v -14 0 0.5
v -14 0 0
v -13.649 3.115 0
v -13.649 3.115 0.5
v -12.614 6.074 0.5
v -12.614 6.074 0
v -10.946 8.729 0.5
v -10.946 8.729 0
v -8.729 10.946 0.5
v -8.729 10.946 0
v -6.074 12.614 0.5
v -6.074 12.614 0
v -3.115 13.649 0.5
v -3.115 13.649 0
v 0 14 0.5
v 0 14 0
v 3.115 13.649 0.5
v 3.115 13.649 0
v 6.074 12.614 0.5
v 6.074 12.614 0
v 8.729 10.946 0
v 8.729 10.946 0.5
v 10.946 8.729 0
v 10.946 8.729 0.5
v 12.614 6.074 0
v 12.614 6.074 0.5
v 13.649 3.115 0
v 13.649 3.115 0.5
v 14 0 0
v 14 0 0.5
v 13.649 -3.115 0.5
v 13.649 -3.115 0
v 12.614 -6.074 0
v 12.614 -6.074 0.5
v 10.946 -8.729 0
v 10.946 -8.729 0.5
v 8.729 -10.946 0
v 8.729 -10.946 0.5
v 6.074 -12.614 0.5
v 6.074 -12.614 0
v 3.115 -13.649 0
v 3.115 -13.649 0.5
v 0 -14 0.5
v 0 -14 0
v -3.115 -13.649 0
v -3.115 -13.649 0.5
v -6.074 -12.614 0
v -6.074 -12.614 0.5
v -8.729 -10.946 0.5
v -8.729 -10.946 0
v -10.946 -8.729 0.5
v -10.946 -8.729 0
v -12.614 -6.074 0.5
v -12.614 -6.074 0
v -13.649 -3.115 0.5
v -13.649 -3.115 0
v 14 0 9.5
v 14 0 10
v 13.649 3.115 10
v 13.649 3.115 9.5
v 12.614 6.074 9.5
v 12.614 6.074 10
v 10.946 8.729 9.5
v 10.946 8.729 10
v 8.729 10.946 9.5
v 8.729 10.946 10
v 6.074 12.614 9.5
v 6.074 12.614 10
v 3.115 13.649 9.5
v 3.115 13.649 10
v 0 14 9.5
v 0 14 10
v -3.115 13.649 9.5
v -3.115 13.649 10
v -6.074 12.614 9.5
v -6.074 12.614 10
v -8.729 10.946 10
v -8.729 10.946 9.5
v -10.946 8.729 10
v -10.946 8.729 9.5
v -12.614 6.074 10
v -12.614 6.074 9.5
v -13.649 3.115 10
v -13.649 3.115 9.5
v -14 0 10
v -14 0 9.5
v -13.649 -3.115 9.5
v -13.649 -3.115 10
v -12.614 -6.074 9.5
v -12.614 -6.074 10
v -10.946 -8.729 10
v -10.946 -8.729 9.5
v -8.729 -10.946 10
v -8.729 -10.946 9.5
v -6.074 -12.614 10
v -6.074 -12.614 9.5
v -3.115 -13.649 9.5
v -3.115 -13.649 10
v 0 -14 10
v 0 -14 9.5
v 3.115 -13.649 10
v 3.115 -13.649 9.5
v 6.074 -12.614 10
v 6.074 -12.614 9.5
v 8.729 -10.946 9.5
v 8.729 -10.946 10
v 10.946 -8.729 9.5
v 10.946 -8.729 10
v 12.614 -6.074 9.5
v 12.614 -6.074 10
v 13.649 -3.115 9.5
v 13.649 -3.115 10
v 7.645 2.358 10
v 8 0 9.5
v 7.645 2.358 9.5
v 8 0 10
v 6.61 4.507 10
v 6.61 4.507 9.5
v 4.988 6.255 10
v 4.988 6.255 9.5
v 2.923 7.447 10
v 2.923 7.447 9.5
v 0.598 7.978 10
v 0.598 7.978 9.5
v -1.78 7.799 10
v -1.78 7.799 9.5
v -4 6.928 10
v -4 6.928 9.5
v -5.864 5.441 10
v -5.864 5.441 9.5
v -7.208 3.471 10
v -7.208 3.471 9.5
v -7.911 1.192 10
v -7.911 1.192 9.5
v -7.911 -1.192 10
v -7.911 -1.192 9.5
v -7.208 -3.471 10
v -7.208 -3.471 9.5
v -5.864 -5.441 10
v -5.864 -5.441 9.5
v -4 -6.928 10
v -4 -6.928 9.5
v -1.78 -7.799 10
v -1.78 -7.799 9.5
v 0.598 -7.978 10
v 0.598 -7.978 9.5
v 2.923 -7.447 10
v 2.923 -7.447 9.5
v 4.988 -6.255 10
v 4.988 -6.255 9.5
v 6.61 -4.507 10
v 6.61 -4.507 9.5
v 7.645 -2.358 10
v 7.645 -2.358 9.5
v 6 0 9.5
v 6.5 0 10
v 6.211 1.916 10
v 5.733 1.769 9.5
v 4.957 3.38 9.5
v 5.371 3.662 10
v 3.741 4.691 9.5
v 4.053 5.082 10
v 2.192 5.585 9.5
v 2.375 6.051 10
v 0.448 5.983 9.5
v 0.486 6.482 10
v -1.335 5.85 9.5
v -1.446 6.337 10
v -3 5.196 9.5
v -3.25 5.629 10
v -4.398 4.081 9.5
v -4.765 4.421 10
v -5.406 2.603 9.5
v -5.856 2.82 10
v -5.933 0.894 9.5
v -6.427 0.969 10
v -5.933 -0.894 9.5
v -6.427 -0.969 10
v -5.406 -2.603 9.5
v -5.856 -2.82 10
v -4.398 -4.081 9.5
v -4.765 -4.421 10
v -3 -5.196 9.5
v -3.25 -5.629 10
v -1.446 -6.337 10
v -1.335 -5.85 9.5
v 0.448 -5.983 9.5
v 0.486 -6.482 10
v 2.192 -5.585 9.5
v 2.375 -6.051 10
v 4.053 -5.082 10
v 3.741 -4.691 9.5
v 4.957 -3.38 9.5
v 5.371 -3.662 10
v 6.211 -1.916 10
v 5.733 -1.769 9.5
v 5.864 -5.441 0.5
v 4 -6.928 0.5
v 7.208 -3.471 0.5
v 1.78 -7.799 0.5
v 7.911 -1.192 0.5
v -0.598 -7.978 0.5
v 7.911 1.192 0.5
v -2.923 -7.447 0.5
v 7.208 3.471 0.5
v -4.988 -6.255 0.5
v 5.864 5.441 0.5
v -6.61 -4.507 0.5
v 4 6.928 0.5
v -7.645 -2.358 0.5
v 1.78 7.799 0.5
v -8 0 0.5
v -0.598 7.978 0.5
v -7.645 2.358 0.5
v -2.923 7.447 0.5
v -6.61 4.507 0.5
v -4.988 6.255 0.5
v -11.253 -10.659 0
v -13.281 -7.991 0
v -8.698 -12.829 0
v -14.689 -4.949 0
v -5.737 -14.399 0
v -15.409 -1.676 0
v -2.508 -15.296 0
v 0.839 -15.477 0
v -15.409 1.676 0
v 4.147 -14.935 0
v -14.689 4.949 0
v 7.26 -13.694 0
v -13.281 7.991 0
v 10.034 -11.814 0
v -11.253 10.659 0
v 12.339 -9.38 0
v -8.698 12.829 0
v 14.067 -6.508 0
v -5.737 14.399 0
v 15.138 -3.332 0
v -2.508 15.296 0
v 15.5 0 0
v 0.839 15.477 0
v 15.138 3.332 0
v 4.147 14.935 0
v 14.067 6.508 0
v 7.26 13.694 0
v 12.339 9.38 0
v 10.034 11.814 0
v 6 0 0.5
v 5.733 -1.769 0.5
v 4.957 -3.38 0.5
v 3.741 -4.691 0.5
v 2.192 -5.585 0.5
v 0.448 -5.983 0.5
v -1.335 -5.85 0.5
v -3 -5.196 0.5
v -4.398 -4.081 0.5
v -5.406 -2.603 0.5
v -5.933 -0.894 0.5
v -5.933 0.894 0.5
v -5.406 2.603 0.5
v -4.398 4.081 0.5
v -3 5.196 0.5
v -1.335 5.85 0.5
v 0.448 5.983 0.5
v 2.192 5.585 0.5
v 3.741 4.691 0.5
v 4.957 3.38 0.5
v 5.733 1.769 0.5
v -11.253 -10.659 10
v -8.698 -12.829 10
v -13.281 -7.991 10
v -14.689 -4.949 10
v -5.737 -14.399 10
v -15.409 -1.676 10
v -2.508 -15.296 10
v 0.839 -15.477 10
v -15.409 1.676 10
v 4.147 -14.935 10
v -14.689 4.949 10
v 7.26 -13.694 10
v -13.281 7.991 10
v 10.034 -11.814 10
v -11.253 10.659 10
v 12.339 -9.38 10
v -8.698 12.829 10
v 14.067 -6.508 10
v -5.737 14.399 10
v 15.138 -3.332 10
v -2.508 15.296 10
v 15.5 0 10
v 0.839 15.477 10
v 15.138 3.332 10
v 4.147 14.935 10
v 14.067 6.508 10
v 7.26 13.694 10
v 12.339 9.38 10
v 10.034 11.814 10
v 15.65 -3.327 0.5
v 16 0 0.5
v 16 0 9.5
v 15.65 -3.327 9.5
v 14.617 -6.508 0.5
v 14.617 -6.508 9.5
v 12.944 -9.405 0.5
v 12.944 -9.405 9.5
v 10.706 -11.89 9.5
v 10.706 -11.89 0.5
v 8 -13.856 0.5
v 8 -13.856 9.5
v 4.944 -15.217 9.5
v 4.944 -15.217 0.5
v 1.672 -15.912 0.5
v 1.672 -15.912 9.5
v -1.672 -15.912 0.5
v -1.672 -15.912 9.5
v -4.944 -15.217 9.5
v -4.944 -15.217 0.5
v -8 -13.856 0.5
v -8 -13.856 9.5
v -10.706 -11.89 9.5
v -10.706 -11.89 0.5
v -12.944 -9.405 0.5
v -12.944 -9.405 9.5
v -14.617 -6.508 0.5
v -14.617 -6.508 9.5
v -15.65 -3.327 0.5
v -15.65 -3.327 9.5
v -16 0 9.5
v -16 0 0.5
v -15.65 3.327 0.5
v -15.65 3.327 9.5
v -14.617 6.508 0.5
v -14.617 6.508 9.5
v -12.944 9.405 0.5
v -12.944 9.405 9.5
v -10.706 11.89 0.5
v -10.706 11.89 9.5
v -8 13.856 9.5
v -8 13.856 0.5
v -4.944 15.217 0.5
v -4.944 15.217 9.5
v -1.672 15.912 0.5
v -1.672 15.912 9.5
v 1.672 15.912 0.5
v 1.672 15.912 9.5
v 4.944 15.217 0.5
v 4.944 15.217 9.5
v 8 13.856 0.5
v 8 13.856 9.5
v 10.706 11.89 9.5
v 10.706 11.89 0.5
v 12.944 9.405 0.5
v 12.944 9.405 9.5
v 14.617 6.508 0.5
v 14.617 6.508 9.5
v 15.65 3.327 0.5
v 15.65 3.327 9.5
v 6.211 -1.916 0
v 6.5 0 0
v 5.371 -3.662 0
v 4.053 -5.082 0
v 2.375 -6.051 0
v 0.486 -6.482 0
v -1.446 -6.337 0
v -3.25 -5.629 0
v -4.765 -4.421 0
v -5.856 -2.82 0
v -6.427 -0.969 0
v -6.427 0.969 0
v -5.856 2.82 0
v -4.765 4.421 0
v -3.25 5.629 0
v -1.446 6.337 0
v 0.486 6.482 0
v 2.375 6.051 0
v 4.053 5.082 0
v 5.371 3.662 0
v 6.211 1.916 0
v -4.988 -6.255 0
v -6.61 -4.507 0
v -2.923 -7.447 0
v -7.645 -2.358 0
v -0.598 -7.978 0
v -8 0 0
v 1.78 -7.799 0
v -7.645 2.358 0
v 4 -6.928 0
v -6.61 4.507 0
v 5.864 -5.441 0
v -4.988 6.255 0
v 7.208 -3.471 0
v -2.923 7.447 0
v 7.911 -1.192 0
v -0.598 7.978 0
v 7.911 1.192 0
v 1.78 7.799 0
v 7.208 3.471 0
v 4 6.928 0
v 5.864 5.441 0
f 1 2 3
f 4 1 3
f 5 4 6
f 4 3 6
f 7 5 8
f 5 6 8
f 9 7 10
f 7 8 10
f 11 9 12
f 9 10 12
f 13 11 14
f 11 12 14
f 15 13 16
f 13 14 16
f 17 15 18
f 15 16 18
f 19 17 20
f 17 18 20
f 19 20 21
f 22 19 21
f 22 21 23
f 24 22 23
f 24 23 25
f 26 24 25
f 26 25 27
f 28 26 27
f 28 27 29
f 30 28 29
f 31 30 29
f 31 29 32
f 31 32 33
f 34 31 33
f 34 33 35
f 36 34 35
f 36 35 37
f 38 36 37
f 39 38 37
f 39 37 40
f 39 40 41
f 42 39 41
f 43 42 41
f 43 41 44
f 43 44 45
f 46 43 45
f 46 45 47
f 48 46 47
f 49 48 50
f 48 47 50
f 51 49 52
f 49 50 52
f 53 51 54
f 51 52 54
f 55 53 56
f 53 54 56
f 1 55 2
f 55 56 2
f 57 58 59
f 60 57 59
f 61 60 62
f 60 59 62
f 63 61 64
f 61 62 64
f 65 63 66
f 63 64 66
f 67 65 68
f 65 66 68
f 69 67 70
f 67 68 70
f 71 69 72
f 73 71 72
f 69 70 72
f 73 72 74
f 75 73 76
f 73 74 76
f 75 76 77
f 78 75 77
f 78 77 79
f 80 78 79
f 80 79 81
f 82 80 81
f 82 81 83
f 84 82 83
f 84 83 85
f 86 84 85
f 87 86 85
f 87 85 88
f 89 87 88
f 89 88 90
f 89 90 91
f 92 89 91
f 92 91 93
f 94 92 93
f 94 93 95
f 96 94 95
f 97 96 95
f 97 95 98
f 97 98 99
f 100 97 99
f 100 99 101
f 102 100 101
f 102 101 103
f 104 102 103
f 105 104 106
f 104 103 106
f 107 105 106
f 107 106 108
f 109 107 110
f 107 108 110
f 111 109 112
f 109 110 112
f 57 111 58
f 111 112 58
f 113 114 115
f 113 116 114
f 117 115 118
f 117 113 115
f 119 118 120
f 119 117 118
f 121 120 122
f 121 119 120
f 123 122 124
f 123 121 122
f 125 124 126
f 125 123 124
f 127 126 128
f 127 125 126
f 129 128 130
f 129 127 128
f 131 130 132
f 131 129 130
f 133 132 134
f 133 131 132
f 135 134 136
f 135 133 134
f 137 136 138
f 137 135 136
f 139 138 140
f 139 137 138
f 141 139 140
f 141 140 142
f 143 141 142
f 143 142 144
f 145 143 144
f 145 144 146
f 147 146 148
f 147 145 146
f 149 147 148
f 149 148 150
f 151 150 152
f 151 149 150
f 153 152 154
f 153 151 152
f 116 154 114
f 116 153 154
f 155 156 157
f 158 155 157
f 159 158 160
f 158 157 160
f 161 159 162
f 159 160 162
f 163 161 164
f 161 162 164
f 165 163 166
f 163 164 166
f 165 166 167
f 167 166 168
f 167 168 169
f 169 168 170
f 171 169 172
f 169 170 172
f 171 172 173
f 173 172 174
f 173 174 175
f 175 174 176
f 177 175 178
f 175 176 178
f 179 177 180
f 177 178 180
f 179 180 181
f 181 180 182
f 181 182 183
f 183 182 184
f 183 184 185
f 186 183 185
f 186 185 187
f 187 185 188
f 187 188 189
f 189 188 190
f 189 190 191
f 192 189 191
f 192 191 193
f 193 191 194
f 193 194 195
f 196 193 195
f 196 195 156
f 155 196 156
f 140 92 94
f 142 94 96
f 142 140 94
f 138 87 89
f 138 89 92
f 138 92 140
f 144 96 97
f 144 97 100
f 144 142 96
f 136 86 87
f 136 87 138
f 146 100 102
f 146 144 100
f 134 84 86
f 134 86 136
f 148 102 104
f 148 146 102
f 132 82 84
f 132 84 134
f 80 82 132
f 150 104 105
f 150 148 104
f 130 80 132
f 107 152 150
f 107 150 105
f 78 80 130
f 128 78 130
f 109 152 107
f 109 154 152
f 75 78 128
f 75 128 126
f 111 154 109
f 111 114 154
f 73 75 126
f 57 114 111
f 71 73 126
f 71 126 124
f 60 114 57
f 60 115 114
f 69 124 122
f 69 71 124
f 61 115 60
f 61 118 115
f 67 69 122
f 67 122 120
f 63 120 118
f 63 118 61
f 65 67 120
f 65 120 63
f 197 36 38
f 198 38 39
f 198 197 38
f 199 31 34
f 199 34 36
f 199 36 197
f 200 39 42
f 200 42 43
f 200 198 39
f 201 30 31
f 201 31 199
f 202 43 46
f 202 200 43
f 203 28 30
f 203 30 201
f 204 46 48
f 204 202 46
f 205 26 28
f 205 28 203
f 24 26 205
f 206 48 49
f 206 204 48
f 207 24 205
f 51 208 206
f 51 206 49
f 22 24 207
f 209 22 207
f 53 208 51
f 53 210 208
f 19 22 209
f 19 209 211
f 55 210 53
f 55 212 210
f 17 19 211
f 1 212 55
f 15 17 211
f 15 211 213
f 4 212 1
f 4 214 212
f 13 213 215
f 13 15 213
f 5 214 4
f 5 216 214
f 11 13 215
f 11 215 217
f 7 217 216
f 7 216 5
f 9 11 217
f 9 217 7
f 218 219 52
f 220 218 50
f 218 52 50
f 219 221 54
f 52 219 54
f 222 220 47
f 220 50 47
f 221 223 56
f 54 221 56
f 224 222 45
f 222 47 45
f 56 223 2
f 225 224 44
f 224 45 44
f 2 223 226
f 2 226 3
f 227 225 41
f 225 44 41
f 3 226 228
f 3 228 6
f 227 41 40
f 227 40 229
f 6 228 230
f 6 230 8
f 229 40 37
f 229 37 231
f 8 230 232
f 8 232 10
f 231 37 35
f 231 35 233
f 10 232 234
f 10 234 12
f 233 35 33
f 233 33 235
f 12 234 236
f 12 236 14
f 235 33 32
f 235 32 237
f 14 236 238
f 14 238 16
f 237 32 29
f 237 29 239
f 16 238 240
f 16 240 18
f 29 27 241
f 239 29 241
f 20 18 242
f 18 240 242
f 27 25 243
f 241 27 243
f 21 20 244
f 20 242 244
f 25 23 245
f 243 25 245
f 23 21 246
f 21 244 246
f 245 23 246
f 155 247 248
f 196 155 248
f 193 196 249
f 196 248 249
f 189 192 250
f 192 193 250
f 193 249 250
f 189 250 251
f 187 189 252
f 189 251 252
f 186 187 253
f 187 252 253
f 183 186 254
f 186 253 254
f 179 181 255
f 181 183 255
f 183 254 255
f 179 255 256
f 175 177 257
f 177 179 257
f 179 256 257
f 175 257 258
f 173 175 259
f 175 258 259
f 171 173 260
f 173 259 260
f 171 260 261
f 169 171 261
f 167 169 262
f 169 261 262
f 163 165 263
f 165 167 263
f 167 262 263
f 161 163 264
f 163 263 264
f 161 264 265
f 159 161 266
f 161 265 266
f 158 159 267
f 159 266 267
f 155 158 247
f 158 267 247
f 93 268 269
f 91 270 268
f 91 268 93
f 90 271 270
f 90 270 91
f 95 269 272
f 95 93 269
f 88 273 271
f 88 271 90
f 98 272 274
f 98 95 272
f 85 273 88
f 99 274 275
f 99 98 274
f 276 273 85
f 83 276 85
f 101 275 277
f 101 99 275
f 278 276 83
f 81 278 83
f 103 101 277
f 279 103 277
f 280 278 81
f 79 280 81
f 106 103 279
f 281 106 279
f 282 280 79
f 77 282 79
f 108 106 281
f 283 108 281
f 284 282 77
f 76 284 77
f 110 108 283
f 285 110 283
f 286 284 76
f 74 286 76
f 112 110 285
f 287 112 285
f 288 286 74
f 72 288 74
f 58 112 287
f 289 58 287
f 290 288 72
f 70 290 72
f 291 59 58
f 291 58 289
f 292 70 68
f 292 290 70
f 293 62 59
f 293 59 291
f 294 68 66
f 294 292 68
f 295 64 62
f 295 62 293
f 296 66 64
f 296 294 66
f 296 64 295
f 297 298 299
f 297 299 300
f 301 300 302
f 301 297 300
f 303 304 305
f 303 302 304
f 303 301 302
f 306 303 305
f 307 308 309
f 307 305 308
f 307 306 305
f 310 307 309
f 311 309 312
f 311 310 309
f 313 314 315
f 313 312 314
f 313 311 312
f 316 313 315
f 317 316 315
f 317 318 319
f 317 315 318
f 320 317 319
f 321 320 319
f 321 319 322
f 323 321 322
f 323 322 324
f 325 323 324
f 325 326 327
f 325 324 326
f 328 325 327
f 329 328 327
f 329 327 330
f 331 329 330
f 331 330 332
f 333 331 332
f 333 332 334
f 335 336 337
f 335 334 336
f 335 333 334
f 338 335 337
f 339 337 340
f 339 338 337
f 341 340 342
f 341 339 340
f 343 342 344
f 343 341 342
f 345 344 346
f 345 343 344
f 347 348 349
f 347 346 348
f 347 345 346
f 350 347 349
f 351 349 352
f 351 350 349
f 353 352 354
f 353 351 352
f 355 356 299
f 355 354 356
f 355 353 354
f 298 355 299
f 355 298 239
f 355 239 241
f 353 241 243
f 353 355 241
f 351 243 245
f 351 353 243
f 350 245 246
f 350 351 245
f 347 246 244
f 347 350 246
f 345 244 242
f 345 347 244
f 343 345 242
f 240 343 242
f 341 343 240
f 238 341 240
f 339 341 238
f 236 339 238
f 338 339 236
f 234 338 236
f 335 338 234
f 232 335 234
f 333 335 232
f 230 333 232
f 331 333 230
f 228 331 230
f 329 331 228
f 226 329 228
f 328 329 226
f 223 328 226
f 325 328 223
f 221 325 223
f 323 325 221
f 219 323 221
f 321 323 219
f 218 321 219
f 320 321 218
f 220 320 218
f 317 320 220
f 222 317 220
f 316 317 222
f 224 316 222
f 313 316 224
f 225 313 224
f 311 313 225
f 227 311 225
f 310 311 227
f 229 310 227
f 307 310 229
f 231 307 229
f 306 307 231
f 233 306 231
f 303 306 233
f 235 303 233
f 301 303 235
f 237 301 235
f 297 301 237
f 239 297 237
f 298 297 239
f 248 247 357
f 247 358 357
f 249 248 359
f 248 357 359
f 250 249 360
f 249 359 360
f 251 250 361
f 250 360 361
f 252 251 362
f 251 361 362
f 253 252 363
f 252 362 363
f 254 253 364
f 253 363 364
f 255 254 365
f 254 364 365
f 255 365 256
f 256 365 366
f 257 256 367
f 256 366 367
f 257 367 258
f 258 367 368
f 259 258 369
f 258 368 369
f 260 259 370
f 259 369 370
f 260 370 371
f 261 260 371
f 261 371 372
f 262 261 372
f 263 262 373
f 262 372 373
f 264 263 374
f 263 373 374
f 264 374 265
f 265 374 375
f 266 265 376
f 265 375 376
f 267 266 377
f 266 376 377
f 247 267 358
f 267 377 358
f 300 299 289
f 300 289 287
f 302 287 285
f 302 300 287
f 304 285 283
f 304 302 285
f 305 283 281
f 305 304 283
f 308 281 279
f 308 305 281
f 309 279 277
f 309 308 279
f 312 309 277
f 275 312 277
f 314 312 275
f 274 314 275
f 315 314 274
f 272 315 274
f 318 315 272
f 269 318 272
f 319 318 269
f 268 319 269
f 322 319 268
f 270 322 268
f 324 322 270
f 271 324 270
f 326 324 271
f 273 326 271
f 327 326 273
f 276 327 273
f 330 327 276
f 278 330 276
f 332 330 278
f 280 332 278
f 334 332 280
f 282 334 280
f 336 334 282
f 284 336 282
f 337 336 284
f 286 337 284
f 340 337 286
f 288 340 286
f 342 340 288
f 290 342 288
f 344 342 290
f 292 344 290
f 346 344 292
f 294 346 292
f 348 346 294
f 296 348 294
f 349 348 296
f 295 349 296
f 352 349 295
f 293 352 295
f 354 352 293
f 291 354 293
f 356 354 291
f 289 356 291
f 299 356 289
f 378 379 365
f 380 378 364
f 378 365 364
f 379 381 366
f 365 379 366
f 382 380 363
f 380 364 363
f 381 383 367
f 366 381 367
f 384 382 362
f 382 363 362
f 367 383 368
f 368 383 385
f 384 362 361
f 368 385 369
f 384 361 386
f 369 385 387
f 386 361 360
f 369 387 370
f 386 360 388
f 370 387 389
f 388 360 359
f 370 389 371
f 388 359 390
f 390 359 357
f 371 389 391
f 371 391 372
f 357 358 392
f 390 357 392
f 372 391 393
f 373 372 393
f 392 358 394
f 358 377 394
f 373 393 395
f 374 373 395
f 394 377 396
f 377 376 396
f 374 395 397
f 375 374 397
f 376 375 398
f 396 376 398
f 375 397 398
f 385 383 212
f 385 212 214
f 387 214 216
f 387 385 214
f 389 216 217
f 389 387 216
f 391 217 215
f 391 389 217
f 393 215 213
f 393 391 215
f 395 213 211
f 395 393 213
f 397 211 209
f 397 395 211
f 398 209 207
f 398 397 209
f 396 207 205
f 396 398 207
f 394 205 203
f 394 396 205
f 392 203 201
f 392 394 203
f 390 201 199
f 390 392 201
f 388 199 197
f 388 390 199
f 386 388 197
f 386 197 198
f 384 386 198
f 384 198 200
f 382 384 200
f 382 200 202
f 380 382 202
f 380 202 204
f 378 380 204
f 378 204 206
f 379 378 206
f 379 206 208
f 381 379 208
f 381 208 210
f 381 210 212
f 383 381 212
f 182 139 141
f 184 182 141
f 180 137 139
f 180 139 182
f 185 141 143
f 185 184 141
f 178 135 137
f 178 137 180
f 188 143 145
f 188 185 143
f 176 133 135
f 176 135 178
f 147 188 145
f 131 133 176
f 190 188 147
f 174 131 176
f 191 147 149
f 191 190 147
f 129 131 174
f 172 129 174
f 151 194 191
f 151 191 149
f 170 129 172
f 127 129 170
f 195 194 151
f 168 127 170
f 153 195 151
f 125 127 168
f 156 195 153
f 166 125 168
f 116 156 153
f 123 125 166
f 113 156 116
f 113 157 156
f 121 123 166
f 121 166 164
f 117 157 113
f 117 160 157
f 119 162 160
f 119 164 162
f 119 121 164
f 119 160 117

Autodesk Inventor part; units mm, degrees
ref_plane "YZ Plane" through (0, 0, 0) normal (1, 0, 0) x (0, 1, 0)
ref_plane "XZ Plane" through (0, 0, 0) normal (0, 1, 0) x (-1, 0, 0)
ref_plane "XY Plane" through (0, 0, 0) normal (0, 0, 1) x (1, 0, 0)
sketch "Sketch1" plane through (0, 0, 0) normal (0, 0, 1) x (1, 0, 0)
  circle A0 centre (0, 0) radius 6
  circle A1 centre (0, 0) radius 16
  dimension "d0" = 12
  dimension "d1" = 32
extrude "Extrusion1" add sketch "Sketch1" along normal blind 10
sketch "Sketch2" plane through (0, 0, 10) normal (0, 0, 1) x (1, 0, 0)
  circle A0 centre (0, 0) radius 6 projected
  circle A1 centre (0, 0) radius 6 projected
  circle A2 centre (0, 0) radius 16 projected
  circle A3 centre (0, 0) radius 8
  circle A4 centre (0, 0) radius 14
  dimension "d4" = 2
  dimension "d5" = 2
extrude "Extrusion2" cut sketch "Sketch2" against normal blind 0.5 contours A4
sketch "Sketch3" plane through (0, 0, 0) normal (0, 0, -1) x (-1, 0, 0)
  circle A0 centre (0, 0) radius 8 projected
  circle A1 centre (0, 0) radius 14 projected
extrude "Extrusion3" cut sketch "Sketch3" against normal blind 0.5
chamfer "Chamfer1" distance 0.5 angle 45 4 edges at (-16, 0, 10) (-16, 0, 0) (-6, 0, 10) (-6, 0, 0)
properties part number "6201-2RS" material "Stainless Steel"
